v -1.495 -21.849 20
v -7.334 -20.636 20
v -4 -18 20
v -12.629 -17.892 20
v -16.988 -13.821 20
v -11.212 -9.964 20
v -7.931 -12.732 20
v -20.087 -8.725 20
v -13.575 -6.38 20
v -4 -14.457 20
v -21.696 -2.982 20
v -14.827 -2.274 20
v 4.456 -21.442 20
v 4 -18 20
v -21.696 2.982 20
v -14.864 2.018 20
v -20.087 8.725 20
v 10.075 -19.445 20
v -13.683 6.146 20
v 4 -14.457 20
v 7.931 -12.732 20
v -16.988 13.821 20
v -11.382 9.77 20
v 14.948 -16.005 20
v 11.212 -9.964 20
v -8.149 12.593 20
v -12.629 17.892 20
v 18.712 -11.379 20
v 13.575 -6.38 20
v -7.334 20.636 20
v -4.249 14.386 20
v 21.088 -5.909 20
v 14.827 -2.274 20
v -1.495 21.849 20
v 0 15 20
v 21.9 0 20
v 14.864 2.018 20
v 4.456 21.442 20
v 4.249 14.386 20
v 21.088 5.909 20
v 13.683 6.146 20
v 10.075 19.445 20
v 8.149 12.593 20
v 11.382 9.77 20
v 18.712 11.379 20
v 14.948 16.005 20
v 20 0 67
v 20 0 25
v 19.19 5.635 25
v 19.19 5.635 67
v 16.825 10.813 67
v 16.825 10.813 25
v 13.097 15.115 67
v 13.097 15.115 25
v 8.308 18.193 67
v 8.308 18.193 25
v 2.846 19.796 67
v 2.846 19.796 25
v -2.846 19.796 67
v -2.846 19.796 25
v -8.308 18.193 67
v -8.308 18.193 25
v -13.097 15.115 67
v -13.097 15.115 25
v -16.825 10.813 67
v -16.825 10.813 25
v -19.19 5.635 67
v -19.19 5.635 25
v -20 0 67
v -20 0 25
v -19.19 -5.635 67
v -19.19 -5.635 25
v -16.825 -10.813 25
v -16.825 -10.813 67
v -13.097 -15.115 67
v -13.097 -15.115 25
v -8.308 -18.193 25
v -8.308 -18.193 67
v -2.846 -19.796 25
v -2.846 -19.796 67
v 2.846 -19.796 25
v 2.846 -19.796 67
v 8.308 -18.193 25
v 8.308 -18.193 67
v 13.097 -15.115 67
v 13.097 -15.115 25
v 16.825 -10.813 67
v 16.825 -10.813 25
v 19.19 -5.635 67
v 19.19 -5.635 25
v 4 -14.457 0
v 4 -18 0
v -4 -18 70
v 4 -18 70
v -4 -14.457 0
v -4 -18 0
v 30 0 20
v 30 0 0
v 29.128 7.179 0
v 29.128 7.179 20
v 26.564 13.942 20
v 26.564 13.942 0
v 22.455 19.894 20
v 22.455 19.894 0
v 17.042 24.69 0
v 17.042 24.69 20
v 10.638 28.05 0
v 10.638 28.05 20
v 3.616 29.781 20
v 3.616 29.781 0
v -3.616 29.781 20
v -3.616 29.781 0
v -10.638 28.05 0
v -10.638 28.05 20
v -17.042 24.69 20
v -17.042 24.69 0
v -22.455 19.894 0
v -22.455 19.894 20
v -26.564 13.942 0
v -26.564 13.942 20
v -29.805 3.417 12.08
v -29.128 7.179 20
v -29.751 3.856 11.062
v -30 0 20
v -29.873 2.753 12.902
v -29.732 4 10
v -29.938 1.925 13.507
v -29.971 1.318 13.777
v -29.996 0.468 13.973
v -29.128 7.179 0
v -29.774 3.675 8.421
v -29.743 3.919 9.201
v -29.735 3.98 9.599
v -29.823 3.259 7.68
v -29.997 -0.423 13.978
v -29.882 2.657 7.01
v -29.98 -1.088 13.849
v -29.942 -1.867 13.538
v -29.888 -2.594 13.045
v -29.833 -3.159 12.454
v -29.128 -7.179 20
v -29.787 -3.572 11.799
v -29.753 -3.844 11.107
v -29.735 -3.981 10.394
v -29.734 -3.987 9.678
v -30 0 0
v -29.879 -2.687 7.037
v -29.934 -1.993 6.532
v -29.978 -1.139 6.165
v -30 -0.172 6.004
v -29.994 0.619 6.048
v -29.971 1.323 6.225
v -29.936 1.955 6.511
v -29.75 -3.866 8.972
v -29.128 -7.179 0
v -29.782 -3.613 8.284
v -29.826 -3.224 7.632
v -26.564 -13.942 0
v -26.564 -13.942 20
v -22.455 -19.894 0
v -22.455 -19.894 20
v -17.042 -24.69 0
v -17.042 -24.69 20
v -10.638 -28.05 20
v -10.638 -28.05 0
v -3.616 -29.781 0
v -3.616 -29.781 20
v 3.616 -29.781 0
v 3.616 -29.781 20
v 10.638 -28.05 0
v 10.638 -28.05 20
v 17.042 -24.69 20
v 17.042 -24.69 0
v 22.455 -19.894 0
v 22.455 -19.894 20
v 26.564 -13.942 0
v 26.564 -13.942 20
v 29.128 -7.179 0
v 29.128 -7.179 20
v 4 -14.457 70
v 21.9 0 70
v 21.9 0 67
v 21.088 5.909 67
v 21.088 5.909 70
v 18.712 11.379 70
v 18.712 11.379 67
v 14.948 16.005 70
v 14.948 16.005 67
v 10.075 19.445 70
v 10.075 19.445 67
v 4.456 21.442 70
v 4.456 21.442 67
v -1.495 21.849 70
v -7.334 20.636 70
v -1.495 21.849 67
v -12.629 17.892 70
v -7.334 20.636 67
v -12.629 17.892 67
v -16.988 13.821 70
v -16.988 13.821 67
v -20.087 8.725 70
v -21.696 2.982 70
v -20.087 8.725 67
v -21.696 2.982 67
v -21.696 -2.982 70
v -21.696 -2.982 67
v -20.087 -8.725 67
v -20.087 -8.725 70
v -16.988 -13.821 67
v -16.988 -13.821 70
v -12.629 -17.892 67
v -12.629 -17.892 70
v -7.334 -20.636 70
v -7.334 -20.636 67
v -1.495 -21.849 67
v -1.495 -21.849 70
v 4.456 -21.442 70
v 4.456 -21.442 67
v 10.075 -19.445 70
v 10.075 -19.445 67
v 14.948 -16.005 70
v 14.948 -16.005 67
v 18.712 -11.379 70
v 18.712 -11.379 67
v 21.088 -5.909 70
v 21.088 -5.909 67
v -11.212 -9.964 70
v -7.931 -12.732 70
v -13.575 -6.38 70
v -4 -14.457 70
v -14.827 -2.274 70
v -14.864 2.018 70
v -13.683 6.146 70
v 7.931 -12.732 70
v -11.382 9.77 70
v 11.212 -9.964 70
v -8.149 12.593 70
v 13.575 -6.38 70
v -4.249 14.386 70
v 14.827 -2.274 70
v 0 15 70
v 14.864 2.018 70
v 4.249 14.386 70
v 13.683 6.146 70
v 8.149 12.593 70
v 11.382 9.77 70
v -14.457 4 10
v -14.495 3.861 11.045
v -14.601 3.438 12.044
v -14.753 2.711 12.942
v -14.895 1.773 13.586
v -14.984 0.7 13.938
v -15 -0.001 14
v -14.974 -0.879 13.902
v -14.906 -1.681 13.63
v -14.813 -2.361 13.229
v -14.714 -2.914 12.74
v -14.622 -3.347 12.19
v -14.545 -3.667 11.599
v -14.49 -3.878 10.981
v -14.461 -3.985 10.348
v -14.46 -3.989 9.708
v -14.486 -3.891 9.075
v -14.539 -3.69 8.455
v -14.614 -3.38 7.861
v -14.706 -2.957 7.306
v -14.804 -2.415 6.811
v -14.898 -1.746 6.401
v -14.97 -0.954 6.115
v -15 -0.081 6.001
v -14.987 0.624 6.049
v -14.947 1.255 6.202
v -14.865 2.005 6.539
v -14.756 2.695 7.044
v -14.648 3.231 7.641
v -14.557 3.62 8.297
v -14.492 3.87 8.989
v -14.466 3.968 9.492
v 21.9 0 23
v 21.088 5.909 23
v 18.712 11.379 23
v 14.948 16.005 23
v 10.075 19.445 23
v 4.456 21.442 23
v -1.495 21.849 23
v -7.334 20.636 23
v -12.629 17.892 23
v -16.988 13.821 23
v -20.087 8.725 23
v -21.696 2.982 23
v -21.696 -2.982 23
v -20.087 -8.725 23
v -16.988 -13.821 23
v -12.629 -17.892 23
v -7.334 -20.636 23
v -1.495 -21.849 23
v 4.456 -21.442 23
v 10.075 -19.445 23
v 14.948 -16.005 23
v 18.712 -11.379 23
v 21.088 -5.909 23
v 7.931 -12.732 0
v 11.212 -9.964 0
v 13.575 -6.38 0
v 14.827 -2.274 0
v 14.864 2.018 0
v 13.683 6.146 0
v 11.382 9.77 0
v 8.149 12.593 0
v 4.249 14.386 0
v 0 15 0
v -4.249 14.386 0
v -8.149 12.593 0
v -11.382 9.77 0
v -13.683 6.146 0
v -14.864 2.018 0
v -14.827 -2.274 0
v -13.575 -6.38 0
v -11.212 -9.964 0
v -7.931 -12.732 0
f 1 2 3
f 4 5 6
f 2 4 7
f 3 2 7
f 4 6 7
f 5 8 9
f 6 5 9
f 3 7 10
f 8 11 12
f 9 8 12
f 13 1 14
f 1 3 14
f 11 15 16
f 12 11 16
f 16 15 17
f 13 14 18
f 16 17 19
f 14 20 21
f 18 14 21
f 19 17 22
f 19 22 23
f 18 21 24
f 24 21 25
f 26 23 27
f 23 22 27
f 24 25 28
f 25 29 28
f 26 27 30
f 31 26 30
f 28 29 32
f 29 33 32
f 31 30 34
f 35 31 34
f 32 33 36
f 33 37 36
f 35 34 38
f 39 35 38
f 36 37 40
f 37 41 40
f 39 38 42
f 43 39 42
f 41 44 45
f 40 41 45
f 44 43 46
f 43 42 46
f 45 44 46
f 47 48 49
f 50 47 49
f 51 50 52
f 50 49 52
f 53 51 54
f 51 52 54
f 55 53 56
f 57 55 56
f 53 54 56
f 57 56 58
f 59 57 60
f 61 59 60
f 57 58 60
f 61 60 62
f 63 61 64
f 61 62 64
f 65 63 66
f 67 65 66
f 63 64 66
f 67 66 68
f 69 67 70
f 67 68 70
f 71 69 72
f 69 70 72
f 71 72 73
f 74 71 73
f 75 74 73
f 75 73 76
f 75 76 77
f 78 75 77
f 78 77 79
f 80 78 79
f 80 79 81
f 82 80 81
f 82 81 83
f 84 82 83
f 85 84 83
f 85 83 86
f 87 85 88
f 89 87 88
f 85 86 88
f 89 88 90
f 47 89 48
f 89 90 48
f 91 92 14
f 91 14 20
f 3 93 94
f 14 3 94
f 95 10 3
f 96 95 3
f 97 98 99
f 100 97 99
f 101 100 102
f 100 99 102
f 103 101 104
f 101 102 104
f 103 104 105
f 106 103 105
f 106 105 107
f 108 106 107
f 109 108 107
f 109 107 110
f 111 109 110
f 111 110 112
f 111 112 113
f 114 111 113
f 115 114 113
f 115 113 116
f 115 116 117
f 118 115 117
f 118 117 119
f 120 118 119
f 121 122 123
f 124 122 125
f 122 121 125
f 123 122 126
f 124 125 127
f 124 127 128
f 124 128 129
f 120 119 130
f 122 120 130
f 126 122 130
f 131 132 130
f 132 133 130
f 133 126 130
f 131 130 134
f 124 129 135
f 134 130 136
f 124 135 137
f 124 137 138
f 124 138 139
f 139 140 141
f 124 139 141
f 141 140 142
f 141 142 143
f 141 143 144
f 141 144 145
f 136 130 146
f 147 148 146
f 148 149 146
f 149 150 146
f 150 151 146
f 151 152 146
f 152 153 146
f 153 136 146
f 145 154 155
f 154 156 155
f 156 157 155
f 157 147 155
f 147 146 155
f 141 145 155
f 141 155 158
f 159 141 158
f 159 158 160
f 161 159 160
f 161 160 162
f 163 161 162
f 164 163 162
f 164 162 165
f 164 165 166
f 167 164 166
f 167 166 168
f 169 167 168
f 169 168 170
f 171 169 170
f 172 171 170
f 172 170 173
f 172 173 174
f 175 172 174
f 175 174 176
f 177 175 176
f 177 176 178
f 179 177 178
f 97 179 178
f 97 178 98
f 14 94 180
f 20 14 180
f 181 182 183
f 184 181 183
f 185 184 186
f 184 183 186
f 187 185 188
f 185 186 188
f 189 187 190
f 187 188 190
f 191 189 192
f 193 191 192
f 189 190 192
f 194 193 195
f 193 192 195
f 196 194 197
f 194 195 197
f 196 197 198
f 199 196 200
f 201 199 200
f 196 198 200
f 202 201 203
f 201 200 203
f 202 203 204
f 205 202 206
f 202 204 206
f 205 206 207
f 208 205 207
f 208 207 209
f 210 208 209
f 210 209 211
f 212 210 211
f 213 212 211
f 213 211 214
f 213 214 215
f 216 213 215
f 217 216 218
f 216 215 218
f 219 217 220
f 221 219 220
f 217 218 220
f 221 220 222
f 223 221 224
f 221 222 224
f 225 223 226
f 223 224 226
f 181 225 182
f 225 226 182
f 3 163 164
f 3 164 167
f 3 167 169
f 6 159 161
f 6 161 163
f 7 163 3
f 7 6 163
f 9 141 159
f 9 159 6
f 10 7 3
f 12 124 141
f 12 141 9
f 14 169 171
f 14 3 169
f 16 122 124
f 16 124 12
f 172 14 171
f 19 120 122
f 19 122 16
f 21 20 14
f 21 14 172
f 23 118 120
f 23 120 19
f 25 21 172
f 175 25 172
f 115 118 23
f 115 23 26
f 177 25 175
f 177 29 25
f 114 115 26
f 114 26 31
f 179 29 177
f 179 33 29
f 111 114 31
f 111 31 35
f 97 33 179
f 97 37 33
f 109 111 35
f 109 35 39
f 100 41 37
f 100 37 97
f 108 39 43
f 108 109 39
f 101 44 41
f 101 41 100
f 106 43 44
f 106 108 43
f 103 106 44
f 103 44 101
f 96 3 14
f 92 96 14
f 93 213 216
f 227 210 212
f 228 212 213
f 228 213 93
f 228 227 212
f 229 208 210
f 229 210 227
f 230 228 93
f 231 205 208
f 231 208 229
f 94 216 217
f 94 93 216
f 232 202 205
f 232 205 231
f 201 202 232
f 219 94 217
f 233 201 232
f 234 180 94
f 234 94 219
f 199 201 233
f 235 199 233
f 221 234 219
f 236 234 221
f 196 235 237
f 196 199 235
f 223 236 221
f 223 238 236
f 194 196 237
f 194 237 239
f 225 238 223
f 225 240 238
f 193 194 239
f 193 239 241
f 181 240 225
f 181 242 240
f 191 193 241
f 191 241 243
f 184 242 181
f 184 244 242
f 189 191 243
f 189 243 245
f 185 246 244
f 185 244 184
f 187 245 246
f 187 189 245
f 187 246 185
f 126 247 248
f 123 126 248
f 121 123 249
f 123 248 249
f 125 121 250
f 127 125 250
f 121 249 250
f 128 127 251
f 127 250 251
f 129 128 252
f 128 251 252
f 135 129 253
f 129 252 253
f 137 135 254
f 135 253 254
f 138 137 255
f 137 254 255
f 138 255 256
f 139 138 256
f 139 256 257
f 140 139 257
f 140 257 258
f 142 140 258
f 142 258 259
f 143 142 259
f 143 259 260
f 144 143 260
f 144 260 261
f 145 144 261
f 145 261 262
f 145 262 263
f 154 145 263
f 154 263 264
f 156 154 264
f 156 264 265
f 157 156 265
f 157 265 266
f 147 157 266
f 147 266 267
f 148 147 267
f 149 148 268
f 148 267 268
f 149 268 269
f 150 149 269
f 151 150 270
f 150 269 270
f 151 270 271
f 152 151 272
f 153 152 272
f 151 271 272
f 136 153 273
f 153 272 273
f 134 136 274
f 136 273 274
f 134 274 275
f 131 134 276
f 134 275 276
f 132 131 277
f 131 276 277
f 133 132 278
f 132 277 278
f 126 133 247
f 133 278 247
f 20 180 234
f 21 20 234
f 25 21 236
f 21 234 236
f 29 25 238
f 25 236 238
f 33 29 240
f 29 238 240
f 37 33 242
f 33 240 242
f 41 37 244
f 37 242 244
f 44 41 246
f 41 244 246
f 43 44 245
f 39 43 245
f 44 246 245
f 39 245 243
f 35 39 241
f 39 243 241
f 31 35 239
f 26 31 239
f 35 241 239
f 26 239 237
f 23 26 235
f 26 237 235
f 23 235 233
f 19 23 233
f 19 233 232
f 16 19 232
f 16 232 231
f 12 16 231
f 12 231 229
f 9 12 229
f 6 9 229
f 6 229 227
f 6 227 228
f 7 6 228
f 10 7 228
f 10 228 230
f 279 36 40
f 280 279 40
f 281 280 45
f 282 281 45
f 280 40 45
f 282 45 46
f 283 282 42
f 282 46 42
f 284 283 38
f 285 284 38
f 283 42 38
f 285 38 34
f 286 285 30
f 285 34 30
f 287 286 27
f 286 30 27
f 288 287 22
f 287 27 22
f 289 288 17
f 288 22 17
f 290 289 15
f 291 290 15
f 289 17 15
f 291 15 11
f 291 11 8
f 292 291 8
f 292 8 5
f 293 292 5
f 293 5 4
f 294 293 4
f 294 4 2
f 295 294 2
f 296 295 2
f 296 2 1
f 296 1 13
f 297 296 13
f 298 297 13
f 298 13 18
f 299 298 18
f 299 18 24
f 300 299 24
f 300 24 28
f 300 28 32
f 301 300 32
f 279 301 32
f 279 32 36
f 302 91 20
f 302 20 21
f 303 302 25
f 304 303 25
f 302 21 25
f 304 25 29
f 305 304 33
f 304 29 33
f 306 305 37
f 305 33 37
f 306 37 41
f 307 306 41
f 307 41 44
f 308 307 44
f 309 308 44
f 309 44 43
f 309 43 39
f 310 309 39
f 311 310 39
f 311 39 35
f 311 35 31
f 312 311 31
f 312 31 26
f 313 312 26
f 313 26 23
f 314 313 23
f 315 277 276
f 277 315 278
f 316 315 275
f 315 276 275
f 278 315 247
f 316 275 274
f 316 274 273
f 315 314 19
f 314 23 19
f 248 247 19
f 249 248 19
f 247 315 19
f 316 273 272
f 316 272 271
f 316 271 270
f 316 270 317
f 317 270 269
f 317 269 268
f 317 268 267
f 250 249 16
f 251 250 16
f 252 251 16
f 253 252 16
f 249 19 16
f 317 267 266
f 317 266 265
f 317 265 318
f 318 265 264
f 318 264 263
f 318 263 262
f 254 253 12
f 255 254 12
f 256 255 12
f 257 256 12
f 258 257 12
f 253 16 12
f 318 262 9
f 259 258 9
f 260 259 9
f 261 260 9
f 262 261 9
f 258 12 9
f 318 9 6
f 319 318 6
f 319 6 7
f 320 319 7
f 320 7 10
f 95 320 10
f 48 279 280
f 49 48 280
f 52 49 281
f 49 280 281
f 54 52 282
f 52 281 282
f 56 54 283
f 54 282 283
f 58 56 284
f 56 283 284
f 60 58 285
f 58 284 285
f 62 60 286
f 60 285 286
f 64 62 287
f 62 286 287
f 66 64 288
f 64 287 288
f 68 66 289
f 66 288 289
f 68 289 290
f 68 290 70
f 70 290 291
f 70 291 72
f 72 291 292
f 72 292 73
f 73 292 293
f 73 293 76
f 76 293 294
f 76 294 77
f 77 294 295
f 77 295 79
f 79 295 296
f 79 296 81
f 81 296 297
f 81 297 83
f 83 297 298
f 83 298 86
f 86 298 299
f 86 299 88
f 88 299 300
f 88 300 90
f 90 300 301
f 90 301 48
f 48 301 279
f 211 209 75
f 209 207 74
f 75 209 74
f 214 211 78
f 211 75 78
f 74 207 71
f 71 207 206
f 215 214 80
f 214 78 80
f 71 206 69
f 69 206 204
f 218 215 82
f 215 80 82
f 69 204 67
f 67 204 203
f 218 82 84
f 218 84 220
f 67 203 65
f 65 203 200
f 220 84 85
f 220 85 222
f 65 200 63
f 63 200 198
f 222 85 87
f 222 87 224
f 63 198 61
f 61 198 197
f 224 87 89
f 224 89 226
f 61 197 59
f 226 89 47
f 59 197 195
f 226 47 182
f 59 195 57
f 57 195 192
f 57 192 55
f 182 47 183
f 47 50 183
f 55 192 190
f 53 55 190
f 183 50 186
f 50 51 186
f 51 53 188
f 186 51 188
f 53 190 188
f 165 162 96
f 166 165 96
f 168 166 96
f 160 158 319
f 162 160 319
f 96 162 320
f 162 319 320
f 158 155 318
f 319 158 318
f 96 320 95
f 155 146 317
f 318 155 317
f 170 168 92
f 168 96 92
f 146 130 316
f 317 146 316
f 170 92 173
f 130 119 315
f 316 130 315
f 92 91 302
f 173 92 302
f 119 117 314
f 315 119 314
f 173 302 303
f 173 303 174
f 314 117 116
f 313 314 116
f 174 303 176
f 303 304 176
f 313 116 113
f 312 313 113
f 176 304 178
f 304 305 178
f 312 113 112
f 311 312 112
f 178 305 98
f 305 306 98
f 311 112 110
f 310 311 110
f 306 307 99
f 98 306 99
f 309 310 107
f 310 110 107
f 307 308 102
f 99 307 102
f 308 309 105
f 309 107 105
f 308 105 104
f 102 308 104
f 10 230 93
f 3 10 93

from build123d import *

# Parameters (mm, degrees)
F0_R      = 30
F1_DEPTH  = 20
F3_R      = 21.9
F4_DEPTH  = 3
F6_R      = 21.9
F7_DEPTH  = 2
F9_R      = 20
F10_DEPTH = 42
F12_R     = 21.9
F13_DEPTH = 3
F15_R     = 4
F16_DEPTH = 63.4
F18_DEPTH = 171
F19_SIZE2 = 1.99999
F19_SIZE  = 1.89999


# Not quite as in the source:
# - a fillet or chamfer is up to 0.001 mm smaller than in the source, because OpenCascade refuses the exact size


with BuildPart() as f1:
    # F0 (on Top) → F1 (new body)
    with BuildSketch(Plane.XY):
        Circle(F0_R)
    extrude(amount=F1_DEPTH)

    # F15 (on Right) → F16 (cut)
    with BuildSketch(Plane.YZ):
        with Locations((0, 10)):
            Circle(F15_R)
    extrude(amount=-F16_DEPTH, mode=Mode.SUBTRACT)


with BuildPart() as f4:
    # F3 (on offset) → F4 (new body)
    with BuildSketch(Plane.XY.offset(20)):
        Circle(F3_R)
    extrude(amount=F4_DEPTH)

    # F6 (on offset) → F7 (join)
    with BuildSketch(Plane.XY.offset(23)):
        Circle(F6_R)
    extrude(amount=F7_DEPTH)

    # F9 (on offset) → F10 (join)
    with BuildSketch(Plane.XY.offset(25)):
        Circle(F9_R)
    extrude(amount=F10_DEPTH)

    # F12 (on offset) → F13 (join)
    with BuildSketch(Plane.XY.offset(67)):
        Circle(F12_R)
    extrude(amount=F13_DEPTH)


with BuildPart() as f18_tool:
    # F17 (on offset) → F18 (new body)
    with BuildSketch(Plane.XY.offset(70)):
        with BuildLine():
            Line((4, -18), (4, -14.4568322948))
            ThreePointArc((4, -14.4568322948), (0, 15), (-4, -14.4568322948))
            Line((-4, -14.4568322948), (-4, -18))
            Line((-4, -18), (4, -18))
        make_face()
    extrude(amount=-F18_DEPTH)


with BuildPart() as f1_1:
    add(f1.part)

    # F18: cut by f18_tool
    add(f18_tool.part, mode=Mode.SUBTRACT)


with BuildPart() as f4_1:
    add(f4.part)

    # F18: cut by f18_tool
    add(f18_tool.part, mode=Mode.SUBTRACT)

    # F19 (size 1.9 and 2 in the source; OpenCascade refuses exactly that, so slightly less here)
    f19_edges = [f4_1.edges().sort_by_distance(p)[0] for p in [
        (-21.9, 0, 25),
    ]]
    f19_side = f4_1.faces().sort_by_distance((-21.280574, 0, 25))[0]
    chamfer(f19_edges, length=F19_SIZE, length2=F19_SIZE2, reference=f19_side)


solid = Compound([f1_1.part, f4_1.part])
